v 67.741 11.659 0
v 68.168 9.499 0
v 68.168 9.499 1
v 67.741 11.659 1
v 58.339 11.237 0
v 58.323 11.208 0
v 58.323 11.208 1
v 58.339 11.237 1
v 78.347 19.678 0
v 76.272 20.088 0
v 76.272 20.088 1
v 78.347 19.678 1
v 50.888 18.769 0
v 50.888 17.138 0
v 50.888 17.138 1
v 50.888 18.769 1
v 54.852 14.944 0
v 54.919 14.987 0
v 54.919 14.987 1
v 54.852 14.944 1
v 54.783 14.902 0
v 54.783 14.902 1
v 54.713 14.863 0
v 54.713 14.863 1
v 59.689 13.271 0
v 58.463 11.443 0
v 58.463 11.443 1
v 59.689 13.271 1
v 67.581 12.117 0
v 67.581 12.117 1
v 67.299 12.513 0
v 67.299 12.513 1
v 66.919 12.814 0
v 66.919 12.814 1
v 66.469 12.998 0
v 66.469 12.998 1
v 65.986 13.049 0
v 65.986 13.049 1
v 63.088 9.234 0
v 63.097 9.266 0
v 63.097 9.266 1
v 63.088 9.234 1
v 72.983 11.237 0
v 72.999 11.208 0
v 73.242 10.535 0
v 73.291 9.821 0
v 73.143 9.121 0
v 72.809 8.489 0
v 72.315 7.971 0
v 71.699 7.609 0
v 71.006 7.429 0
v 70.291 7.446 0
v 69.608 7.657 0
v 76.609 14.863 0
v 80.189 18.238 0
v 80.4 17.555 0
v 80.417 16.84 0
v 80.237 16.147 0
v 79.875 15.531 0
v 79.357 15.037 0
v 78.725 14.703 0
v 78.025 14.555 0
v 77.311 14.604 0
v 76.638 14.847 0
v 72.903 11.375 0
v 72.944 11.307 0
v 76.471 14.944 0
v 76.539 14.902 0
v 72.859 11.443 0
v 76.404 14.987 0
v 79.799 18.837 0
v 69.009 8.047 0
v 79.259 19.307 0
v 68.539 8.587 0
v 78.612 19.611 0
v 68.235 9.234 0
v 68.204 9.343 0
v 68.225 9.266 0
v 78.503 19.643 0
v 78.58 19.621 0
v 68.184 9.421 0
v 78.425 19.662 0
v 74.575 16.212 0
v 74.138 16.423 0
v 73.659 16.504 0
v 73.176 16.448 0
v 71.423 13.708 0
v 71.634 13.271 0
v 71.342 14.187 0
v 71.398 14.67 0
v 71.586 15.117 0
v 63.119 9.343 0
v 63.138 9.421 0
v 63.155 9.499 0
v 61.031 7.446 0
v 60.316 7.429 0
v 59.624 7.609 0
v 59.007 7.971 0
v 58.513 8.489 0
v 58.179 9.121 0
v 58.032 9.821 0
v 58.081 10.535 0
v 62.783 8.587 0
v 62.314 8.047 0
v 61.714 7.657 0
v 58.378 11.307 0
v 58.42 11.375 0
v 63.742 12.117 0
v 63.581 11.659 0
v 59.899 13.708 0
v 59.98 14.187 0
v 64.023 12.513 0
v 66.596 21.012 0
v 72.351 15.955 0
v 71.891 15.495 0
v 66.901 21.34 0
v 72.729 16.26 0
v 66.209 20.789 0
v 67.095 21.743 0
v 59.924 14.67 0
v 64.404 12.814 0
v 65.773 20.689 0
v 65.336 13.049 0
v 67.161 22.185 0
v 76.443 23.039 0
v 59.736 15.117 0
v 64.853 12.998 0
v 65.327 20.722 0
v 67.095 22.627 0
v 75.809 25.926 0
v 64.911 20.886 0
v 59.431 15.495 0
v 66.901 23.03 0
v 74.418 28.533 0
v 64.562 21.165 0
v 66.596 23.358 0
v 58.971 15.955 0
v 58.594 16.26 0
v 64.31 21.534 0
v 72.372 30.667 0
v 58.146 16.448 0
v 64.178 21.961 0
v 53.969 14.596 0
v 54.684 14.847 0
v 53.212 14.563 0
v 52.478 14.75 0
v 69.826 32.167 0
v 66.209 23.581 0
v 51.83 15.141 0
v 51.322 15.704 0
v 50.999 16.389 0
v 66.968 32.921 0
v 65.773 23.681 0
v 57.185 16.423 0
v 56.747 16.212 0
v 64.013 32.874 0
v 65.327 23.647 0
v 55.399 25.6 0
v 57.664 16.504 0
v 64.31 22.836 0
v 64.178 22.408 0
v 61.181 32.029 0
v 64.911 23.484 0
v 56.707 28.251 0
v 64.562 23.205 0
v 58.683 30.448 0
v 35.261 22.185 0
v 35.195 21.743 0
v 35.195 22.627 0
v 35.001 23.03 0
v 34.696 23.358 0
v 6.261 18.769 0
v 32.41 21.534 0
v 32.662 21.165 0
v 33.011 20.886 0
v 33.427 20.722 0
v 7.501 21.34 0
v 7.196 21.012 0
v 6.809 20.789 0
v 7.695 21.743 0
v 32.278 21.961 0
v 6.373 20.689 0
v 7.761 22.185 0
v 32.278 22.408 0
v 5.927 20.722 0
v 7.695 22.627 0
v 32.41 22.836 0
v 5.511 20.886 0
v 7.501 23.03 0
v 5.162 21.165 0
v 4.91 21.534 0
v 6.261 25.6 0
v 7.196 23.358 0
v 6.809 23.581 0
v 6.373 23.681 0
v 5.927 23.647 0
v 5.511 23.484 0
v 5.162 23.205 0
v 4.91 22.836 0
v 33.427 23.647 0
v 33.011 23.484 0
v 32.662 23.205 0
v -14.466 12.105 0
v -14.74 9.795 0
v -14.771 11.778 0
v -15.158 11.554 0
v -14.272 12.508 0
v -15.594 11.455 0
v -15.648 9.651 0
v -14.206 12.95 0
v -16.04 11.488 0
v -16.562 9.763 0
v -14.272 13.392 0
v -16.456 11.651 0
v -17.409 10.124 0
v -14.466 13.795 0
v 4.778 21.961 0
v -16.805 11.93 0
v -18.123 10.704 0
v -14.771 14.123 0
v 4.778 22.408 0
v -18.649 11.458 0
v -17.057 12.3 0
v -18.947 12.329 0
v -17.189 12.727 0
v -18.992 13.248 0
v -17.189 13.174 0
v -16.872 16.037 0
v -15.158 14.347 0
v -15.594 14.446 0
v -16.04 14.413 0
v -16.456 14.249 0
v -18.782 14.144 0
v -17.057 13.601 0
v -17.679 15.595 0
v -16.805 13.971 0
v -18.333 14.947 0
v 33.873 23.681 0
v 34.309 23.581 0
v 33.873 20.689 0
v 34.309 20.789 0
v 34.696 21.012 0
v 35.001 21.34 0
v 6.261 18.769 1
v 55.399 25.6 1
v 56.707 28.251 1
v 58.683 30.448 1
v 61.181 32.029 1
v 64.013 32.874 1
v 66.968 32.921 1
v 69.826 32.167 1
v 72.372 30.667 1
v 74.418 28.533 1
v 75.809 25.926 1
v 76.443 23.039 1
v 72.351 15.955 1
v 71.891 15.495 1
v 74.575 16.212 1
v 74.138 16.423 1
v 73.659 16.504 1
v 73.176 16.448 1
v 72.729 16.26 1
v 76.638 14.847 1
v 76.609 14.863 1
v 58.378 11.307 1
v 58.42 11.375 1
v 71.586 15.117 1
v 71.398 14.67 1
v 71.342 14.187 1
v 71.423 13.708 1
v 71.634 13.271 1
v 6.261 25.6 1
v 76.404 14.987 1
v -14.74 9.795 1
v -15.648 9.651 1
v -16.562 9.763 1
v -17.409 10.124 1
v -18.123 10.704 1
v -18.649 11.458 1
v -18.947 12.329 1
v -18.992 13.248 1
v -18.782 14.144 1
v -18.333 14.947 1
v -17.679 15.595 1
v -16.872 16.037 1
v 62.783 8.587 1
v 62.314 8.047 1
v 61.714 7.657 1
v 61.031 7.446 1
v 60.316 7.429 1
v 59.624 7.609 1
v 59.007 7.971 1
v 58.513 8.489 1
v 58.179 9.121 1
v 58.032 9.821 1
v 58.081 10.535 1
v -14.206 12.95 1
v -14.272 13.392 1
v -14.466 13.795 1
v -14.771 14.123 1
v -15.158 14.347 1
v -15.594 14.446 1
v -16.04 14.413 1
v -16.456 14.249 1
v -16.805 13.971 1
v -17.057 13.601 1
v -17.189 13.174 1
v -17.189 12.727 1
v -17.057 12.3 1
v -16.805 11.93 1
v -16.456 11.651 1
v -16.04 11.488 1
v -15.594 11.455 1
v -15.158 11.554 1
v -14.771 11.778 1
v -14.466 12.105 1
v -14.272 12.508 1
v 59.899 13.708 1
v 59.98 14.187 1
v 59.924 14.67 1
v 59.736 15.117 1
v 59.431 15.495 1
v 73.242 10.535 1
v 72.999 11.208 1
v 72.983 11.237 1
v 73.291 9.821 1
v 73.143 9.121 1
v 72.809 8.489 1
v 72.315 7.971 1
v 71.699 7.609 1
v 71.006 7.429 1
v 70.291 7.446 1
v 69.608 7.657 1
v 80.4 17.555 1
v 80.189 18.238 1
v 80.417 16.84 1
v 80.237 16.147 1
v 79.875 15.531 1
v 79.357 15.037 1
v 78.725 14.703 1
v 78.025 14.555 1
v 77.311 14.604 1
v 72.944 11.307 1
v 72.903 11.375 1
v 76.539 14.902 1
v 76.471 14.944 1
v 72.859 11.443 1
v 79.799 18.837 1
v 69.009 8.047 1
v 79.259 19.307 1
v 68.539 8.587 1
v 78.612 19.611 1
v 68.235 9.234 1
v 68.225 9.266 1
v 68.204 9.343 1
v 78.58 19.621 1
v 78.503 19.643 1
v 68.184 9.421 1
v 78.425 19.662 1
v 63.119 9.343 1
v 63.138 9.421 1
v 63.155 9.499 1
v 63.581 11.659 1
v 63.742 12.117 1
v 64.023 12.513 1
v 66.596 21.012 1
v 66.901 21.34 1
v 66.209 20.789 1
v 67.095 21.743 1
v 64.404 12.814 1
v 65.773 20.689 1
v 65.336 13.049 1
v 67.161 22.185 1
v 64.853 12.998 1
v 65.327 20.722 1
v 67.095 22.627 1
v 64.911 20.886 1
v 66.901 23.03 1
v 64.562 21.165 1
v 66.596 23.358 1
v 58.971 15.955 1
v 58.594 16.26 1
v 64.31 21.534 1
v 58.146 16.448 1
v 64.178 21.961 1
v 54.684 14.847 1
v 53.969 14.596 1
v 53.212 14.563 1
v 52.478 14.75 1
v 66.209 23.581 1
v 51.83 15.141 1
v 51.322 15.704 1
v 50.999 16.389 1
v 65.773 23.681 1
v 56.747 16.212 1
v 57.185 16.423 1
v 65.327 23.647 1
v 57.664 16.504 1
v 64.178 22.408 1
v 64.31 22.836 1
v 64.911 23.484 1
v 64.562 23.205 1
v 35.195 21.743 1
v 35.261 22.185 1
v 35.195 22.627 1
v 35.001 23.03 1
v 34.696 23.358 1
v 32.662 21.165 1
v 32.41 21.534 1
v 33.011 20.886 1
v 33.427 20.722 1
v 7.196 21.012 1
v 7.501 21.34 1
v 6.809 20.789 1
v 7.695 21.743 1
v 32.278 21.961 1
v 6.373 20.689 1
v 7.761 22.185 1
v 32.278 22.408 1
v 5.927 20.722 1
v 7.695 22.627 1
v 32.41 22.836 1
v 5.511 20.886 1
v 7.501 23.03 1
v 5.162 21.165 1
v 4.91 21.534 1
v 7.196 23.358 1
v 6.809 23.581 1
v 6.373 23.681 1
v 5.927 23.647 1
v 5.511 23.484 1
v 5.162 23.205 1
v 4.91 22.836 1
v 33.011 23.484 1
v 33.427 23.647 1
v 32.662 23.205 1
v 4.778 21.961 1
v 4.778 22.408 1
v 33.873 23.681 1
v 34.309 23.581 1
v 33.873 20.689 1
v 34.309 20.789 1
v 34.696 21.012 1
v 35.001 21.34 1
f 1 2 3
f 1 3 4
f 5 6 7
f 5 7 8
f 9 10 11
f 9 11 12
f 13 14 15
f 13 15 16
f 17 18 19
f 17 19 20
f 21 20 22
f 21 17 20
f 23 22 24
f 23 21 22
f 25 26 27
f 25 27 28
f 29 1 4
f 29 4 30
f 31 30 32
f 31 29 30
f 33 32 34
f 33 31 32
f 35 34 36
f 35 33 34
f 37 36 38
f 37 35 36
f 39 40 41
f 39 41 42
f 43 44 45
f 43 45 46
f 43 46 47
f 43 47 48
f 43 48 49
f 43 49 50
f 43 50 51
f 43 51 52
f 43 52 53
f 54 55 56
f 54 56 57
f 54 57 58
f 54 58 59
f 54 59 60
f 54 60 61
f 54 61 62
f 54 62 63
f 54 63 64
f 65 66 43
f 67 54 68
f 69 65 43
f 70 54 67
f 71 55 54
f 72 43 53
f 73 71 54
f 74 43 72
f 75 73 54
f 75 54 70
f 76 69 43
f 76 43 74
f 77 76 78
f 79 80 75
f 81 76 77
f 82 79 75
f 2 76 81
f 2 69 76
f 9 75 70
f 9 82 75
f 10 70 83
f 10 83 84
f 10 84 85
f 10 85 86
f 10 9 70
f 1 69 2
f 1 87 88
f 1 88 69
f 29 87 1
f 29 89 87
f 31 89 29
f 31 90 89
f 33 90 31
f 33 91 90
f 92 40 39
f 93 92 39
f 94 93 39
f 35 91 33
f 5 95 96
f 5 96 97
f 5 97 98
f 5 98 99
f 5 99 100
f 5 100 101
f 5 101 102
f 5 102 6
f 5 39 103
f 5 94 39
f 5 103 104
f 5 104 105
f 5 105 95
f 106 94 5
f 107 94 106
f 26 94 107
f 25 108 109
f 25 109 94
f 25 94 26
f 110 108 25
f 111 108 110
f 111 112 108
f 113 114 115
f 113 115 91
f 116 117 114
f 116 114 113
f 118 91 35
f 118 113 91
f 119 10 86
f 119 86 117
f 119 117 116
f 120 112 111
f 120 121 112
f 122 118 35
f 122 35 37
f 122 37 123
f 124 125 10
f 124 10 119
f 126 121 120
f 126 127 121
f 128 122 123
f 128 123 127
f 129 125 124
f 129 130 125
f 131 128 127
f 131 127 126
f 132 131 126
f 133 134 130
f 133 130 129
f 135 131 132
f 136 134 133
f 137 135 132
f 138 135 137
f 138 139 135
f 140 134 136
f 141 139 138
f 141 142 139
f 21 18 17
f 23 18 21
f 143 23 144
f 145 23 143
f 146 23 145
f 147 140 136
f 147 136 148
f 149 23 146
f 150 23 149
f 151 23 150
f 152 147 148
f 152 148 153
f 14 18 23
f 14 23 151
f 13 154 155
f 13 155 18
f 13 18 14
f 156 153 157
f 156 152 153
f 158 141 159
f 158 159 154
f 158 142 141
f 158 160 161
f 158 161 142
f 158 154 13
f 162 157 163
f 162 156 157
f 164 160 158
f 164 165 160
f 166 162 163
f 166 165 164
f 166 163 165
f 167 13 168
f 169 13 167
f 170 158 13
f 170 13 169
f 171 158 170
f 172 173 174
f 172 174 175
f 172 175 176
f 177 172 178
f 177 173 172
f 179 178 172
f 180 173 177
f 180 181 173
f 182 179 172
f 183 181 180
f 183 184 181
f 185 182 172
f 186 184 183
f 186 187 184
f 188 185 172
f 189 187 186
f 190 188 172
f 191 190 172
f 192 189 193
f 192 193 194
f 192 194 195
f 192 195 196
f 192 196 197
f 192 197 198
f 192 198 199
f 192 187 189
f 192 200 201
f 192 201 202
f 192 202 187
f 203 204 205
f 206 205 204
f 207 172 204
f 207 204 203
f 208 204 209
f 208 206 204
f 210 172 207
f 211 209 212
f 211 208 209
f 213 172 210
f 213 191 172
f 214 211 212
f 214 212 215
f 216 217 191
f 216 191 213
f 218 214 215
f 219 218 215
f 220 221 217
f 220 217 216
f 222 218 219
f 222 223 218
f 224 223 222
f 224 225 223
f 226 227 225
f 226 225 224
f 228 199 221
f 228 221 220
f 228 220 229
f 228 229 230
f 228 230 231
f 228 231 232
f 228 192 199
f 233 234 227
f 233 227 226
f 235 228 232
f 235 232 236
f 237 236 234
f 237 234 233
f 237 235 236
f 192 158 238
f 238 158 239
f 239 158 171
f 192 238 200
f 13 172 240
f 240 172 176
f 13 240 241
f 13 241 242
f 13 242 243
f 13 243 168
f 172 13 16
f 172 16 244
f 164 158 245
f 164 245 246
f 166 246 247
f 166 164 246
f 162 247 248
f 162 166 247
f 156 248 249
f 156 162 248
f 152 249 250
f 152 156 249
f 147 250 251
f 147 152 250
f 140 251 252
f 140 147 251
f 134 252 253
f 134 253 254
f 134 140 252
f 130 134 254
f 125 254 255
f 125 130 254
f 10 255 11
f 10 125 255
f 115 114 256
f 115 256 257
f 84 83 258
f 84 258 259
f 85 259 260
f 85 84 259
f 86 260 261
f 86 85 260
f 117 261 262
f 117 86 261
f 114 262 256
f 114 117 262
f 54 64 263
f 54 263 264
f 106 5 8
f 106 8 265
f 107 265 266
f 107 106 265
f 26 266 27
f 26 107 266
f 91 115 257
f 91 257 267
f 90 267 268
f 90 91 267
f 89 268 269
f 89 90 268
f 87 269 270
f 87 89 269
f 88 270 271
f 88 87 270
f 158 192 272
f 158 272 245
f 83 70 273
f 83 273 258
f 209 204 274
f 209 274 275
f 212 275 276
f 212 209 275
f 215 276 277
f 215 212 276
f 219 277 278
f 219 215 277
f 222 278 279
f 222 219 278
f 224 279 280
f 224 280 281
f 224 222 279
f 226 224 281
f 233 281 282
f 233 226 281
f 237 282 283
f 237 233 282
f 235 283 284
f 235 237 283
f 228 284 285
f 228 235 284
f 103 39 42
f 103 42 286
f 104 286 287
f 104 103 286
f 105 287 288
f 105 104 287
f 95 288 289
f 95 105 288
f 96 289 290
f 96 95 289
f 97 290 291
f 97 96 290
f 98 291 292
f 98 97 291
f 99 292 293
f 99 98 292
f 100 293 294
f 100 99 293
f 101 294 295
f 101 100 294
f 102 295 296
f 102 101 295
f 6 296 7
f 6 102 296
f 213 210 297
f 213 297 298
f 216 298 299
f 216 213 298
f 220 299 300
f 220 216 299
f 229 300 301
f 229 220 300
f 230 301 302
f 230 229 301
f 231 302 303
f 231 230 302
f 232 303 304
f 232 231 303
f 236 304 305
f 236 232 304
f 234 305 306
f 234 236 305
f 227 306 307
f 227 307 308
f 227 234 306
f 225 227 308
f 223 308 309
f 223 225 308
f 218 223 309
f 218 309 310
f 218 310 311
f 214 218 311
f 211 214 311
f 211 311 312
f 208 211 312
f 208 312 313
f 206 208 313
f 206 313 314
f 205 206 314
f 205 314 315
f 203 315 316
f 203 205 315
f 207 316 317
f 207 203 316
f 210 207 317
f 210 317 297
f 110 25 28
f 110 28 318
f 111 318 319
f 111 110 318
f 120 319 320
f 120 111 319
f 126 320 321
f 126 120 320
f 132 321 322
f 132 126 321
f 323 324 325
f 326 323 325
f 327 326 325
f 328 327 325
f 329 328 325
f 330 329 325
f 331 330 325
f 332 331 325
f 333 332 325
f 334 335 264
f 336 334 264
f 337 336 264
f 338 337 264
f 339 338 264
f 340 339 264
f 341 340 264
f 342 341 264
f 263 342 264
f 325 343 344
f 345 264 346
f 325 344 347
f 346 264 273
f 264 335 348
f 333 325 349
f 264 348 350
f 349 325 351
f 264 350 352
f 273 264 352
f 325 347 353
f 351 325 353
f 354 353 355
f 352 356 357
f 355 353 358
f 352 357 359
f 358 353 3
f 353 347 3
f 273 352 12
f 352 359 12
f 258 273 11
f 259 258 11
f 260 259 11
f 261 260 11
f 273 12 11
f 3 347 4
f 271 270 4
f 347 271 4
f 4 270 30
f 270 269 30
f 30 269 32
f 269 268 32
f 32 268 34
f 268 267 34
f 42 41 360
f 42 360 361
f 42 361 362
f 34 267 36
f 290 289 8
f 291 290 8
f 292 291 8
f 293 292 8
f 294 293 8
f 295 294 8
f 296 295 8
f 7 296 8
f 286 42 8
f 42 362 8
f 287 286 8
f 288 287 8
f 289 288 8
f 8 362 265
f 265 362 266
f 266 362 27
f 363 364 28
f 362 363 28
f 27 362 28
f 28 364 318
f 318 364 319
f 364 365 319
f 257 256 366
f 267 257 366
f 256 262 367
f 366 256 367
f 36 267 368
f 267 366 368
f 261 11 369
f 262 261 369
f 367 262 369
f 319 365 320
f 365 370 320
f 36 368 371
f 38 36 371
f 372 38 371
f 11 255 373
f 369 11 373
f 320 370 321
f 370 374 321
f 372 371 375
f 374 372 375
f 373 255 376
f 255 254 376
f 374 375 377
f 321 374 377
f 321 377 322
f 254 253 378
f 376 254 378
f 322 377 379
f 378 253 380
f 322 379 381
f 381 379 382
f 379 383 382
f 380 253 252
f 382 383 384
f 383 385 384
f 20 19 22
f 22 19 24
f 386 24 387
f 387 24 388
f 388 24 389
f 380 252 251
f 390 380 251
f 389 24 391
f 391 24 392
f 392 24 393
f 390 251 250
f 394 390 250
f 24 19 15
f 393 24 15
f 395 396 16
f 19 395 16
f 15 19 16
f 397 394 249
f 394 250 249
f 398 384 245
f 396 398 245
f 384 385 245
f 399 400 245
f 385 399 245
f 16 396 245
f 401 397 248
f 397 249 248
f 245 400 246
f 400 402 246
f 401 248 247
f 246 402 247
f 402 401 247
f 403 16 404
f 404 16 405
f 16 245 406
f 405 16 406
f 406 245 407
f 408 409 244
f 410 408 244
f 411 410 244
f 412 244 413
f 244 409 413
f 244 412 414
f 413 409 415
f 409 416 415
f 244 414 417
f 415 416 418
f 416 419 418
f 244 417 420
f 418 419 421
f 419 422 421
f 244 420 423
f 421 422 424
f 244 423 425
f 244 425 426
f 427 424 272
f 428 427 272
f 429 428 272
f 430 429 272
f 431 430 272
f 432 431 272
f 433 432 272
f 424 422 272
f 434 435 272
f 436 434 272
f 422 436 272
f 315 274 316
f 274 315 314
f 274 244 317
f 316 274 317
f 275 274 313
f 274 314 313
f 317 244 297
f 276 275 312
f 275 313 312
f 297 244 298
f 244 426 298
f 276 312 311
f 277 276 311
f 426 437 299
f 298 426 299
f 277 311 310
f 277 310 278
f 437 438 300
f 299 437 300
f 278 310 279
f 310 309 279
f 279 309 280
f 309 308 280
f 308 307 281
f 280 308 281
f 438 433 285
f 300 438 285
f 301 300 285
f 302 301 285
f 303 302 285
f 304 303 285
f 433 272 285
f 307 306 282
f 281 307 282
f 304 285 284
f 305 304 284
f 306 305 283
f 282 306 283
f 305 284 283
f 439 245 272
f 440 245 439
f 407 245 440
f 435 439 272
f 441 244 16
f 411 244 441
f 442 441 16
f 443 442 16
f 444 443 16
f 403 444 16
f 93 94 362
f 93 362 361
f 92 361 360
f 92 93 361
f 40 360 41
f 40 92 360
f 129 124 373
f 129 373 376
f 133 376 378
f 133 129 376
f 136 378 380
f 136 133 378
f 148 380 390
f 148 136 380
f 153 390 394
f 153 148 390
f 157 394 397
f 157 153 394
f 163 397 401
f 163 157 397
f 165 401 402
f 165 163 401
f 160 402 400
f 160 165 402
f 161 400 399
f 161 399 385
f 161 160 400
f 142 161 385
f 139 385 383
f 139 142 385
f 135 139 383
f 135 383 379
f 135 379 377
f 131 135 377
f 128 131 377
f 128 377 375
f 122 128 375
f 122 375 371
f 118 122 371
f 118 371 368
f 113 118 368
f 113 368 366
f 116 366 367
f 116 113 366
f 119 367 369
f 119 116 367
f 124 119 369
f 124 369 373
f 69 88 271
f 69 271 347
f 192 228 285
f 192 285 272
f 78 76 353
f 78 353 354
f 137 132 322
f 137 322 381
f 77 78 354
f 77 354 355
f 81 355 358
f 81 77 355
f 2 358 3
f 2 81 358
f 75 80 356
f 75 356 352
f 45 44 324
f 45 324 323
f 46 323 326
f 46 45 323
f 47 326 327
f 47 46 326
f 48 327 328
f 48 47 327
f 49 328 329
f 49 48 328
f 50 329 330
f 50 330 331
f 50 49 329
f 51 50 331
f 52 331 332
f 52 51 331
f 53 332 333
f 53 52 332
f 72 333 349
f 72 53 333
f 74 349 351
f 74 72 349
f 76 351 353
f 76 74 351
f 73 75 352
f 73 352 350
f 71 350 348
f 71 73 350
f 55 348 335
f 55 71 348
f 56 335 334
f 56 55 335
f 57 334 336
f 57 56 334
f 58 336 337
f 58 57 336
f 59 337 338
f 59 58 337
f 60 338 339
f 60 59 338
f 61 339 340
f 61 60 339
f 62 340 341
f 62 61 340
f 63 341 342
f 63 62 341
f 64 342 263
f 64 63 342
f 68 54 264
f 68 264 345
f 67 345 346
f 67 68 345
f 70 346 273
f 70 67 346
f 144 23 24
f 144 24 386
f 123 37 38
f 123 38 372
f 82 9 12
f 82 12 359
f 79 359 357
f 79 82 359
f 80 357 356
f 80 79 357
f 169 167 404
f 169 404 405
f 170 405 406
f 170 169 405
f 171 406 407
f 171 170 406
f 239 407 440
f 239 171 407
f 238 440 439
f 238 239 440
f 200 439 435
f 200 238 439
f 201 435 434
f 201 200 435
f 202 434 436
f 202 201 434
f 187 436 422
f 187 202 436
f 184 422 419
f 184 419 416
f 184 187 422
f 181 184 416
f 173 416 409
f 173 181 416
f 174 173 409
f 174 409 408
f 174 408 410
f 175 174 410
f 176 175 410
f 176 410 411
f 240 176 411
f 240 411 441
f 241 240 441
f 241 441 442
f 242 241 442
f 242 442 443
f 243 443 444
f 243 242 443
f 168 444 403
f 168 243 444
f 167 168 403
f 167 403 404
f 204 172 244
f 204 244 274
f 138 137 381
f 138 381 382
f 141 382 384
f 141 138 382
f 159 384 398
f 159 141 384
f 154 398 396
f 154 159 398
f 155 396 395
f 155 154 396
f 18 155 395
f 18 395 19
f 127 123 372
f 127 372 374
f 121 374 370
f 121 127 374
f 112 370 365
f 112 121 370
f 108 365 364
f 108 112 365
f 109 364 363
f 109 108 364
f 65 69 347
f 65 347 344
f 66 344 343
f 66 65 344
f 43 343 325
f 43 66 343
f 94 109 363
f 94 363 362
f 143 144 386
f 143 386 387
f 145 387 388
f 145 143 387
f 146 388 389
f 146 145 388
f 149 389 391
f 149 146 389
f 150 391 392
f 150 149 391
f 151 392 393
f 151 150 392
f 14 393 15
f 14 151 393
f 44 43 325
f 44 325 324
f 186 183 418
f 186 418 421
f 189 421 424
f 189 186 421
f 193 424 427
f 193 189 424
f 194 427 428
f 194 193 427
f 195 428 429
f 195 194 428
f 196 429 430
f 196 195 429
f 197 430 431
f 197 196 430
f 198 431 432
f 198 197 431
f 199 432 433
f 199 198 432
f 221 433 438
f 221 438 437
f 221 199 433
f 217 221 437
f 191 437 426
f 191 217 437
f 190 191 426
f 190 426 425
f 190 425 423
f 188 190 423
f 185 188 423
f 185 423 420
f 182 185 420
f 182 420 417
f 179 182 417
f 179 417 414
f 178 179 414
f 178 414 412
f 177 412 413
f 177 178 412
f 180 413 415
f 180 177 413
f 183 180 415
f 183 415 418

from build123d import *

# Parameters (mm, degrees)
MODEL_R                 = 1.5
SALIENTE_EXTRUIR1_DEPTH = 1


with BuildPart() as part:
    # Model → Saliente-Extruir1 (new body)
    with BuildSketch(Plane.XY):
        with BuildLine():
            Line((6.261217919, 18.769360839), (-14.739513879, 9.794996238))
            ThreePointArc((-14.739513879, 9.794996238), (-18.828558612, 11.883464999), (-16.872209477, 16.037341099))
            Line((-16.872209477, 16.037341099), (6.261217919, 25.600360839))
            Line((6.261217919, 25.600360839), (33.761217919, 25.600360839))
            Line((33.761217919, 25.600360839), (55.398917602, 25.600360839))
            ThreePointArc((55.398917602, 25.600360839), (68.422679159, 32.642144419), (76.271846628, 20.088433767))
            Line((76.271846628, 20.088433767), (78.346726924, 19.678483017))
            ThreePointArc((78.346726924, 19.678483017), (78.464143806, 19.652436824), (78.580224549, 19.620966371))
            Line((78.580224549, 19.620966371), (78.611928195, 19.611354587))
            ThreePointArc((78.611928195, 19.611354587), (80.237076178, 16.147342665), (76.638496698, 14.847069503))
            Line((76.638496698, 14.847069503), (76.609282278, 14.862690809))
            ThreePointArc((76.609282278, 14.862690809), (76.504947826, 14.922519319), (76.403504113, 14.987128153))
            Line((76.403504113, 14.987128153), (74.575103444, 16.212224841))
            ThreePointArc((74.575103444, 16.212224841), (73.415610314, 16.492916463), (72.35097411, 15.954621135))
            Line((72.35097411, 15.954621135), (71.891457622, 15.495104647))
            ThreePointArc((71.891457622, 15.495104647), (71.353162294, 14.430468442), (71.633853917, 13.270975311))
            Line((71.633853917, 13.270975311), (72.858950606, 11.442574643))
            ThreePointArc((72.858950606, 11.442574643), (72.92355944, 11.34113093), (72.98338795, 11.236796479))
            Line((72.98338795, 11.236796479), (72.999009256, 11.207582059))
            ThreePointArc((72.999009256, 11.207582059), (71.698736047, 7.609002556), (68.234724141, 9.234150662))
            Line((68.234724141, 9.234150662), (68.225112387, 9.265854208))
            ThreePointArc((68.225112387, 9.265854208), (68.193641935, 9.381934951), (68.167595742, 9.499351833))
            Line((68.167595742, 9.499351833), (67.740995408, 11.65850052))
            ThreePointArc((67.740995408, 11.65850052), (67.119588901, 12.676864925), (65.986145145, 13.049044127))
            Line((65.986145145, 13.049044127), (65.336290696, 13.049044127))
            ThreePointArc((65.336290696, 13.049044127), (64.20284694, 12.676864925), (63.581440434, 11.658500522))
            Line((63.581440434, 11.658500522), (63.154840098, 9.499351834))
            ThreePointArc((63.154840098, 9.499351834), (63.128793905, 9.381934952), (63.097323452, 9.265854209))
            Line((63.097323452, 9.265854209), (63.087711668, 9.234150563))
            ThreePointArc((63.087711668, 9.234150563), (59.623699794, 7.609002564), (58.323426536, 11.20758197))
            Line((58.323426536, 11.20758197), (58.33904789, 11.23679648))
            ThreePointArc((58.33904789, 11.23679648), (58.3988764, 11.341130932), (58.463485233, 11.442574645))
            Line((58.463485233, 11.442574645), (59.688581925, 13.270975312))
            ThreePointArc((59.688581925, 13.270975312), (59.969273546, 14.430468443), (59.430978219, 15.495104647))
            Line((59.430978219, 15.495104647), (58.971461731, 15.954621135))
            ThreePointArc((58.971461731, 15.954621135), (57.906825526, 16.492916463), (56.747332395, 16.21222484))
            Line((56.747332395, 16.21222484), (54.918931727, 14.987128151))
            ThreePointArc((54.918931727, 14.987128151), (54.817488014, 14.922519317), (54.713153563, 14.862690807))
            Line((54.713153563, 14.862690807), (54.683939143, 14.847069501))
            ThreePointArc((54.683939143, 14.847069501), (52.139490235, 14.921450429), (50.888257342, 17.138242934))
            Line((50.888257342, 17.138242934), (50.888257342, 18.769360839))
            Line((50.888257342, 18.769360839), (6.261217919, 18.769360839))
        make_face()
        with Locations((65.661217919, 22.184860839)):
            Circle(MODEL_R, mode=Mode.SUBTRACT)
        with Locations((33.761217919, 22.184860839)):
            Circle(MODEL_R, mode=Mode.SUBTRACT)
        with Locations((6.261217919, 22.184860839)):
            Circle(MODEL_R, mode=Mode.SUBTRACT)
        with Locations((-15.705782081, 12.950360839)):
            Circle(MODEL_R, mode=Mode.SUBTRACT)
    extrude(amount=SALIENTE_EXTRUIR1_DEPTH)


solid = part.part
